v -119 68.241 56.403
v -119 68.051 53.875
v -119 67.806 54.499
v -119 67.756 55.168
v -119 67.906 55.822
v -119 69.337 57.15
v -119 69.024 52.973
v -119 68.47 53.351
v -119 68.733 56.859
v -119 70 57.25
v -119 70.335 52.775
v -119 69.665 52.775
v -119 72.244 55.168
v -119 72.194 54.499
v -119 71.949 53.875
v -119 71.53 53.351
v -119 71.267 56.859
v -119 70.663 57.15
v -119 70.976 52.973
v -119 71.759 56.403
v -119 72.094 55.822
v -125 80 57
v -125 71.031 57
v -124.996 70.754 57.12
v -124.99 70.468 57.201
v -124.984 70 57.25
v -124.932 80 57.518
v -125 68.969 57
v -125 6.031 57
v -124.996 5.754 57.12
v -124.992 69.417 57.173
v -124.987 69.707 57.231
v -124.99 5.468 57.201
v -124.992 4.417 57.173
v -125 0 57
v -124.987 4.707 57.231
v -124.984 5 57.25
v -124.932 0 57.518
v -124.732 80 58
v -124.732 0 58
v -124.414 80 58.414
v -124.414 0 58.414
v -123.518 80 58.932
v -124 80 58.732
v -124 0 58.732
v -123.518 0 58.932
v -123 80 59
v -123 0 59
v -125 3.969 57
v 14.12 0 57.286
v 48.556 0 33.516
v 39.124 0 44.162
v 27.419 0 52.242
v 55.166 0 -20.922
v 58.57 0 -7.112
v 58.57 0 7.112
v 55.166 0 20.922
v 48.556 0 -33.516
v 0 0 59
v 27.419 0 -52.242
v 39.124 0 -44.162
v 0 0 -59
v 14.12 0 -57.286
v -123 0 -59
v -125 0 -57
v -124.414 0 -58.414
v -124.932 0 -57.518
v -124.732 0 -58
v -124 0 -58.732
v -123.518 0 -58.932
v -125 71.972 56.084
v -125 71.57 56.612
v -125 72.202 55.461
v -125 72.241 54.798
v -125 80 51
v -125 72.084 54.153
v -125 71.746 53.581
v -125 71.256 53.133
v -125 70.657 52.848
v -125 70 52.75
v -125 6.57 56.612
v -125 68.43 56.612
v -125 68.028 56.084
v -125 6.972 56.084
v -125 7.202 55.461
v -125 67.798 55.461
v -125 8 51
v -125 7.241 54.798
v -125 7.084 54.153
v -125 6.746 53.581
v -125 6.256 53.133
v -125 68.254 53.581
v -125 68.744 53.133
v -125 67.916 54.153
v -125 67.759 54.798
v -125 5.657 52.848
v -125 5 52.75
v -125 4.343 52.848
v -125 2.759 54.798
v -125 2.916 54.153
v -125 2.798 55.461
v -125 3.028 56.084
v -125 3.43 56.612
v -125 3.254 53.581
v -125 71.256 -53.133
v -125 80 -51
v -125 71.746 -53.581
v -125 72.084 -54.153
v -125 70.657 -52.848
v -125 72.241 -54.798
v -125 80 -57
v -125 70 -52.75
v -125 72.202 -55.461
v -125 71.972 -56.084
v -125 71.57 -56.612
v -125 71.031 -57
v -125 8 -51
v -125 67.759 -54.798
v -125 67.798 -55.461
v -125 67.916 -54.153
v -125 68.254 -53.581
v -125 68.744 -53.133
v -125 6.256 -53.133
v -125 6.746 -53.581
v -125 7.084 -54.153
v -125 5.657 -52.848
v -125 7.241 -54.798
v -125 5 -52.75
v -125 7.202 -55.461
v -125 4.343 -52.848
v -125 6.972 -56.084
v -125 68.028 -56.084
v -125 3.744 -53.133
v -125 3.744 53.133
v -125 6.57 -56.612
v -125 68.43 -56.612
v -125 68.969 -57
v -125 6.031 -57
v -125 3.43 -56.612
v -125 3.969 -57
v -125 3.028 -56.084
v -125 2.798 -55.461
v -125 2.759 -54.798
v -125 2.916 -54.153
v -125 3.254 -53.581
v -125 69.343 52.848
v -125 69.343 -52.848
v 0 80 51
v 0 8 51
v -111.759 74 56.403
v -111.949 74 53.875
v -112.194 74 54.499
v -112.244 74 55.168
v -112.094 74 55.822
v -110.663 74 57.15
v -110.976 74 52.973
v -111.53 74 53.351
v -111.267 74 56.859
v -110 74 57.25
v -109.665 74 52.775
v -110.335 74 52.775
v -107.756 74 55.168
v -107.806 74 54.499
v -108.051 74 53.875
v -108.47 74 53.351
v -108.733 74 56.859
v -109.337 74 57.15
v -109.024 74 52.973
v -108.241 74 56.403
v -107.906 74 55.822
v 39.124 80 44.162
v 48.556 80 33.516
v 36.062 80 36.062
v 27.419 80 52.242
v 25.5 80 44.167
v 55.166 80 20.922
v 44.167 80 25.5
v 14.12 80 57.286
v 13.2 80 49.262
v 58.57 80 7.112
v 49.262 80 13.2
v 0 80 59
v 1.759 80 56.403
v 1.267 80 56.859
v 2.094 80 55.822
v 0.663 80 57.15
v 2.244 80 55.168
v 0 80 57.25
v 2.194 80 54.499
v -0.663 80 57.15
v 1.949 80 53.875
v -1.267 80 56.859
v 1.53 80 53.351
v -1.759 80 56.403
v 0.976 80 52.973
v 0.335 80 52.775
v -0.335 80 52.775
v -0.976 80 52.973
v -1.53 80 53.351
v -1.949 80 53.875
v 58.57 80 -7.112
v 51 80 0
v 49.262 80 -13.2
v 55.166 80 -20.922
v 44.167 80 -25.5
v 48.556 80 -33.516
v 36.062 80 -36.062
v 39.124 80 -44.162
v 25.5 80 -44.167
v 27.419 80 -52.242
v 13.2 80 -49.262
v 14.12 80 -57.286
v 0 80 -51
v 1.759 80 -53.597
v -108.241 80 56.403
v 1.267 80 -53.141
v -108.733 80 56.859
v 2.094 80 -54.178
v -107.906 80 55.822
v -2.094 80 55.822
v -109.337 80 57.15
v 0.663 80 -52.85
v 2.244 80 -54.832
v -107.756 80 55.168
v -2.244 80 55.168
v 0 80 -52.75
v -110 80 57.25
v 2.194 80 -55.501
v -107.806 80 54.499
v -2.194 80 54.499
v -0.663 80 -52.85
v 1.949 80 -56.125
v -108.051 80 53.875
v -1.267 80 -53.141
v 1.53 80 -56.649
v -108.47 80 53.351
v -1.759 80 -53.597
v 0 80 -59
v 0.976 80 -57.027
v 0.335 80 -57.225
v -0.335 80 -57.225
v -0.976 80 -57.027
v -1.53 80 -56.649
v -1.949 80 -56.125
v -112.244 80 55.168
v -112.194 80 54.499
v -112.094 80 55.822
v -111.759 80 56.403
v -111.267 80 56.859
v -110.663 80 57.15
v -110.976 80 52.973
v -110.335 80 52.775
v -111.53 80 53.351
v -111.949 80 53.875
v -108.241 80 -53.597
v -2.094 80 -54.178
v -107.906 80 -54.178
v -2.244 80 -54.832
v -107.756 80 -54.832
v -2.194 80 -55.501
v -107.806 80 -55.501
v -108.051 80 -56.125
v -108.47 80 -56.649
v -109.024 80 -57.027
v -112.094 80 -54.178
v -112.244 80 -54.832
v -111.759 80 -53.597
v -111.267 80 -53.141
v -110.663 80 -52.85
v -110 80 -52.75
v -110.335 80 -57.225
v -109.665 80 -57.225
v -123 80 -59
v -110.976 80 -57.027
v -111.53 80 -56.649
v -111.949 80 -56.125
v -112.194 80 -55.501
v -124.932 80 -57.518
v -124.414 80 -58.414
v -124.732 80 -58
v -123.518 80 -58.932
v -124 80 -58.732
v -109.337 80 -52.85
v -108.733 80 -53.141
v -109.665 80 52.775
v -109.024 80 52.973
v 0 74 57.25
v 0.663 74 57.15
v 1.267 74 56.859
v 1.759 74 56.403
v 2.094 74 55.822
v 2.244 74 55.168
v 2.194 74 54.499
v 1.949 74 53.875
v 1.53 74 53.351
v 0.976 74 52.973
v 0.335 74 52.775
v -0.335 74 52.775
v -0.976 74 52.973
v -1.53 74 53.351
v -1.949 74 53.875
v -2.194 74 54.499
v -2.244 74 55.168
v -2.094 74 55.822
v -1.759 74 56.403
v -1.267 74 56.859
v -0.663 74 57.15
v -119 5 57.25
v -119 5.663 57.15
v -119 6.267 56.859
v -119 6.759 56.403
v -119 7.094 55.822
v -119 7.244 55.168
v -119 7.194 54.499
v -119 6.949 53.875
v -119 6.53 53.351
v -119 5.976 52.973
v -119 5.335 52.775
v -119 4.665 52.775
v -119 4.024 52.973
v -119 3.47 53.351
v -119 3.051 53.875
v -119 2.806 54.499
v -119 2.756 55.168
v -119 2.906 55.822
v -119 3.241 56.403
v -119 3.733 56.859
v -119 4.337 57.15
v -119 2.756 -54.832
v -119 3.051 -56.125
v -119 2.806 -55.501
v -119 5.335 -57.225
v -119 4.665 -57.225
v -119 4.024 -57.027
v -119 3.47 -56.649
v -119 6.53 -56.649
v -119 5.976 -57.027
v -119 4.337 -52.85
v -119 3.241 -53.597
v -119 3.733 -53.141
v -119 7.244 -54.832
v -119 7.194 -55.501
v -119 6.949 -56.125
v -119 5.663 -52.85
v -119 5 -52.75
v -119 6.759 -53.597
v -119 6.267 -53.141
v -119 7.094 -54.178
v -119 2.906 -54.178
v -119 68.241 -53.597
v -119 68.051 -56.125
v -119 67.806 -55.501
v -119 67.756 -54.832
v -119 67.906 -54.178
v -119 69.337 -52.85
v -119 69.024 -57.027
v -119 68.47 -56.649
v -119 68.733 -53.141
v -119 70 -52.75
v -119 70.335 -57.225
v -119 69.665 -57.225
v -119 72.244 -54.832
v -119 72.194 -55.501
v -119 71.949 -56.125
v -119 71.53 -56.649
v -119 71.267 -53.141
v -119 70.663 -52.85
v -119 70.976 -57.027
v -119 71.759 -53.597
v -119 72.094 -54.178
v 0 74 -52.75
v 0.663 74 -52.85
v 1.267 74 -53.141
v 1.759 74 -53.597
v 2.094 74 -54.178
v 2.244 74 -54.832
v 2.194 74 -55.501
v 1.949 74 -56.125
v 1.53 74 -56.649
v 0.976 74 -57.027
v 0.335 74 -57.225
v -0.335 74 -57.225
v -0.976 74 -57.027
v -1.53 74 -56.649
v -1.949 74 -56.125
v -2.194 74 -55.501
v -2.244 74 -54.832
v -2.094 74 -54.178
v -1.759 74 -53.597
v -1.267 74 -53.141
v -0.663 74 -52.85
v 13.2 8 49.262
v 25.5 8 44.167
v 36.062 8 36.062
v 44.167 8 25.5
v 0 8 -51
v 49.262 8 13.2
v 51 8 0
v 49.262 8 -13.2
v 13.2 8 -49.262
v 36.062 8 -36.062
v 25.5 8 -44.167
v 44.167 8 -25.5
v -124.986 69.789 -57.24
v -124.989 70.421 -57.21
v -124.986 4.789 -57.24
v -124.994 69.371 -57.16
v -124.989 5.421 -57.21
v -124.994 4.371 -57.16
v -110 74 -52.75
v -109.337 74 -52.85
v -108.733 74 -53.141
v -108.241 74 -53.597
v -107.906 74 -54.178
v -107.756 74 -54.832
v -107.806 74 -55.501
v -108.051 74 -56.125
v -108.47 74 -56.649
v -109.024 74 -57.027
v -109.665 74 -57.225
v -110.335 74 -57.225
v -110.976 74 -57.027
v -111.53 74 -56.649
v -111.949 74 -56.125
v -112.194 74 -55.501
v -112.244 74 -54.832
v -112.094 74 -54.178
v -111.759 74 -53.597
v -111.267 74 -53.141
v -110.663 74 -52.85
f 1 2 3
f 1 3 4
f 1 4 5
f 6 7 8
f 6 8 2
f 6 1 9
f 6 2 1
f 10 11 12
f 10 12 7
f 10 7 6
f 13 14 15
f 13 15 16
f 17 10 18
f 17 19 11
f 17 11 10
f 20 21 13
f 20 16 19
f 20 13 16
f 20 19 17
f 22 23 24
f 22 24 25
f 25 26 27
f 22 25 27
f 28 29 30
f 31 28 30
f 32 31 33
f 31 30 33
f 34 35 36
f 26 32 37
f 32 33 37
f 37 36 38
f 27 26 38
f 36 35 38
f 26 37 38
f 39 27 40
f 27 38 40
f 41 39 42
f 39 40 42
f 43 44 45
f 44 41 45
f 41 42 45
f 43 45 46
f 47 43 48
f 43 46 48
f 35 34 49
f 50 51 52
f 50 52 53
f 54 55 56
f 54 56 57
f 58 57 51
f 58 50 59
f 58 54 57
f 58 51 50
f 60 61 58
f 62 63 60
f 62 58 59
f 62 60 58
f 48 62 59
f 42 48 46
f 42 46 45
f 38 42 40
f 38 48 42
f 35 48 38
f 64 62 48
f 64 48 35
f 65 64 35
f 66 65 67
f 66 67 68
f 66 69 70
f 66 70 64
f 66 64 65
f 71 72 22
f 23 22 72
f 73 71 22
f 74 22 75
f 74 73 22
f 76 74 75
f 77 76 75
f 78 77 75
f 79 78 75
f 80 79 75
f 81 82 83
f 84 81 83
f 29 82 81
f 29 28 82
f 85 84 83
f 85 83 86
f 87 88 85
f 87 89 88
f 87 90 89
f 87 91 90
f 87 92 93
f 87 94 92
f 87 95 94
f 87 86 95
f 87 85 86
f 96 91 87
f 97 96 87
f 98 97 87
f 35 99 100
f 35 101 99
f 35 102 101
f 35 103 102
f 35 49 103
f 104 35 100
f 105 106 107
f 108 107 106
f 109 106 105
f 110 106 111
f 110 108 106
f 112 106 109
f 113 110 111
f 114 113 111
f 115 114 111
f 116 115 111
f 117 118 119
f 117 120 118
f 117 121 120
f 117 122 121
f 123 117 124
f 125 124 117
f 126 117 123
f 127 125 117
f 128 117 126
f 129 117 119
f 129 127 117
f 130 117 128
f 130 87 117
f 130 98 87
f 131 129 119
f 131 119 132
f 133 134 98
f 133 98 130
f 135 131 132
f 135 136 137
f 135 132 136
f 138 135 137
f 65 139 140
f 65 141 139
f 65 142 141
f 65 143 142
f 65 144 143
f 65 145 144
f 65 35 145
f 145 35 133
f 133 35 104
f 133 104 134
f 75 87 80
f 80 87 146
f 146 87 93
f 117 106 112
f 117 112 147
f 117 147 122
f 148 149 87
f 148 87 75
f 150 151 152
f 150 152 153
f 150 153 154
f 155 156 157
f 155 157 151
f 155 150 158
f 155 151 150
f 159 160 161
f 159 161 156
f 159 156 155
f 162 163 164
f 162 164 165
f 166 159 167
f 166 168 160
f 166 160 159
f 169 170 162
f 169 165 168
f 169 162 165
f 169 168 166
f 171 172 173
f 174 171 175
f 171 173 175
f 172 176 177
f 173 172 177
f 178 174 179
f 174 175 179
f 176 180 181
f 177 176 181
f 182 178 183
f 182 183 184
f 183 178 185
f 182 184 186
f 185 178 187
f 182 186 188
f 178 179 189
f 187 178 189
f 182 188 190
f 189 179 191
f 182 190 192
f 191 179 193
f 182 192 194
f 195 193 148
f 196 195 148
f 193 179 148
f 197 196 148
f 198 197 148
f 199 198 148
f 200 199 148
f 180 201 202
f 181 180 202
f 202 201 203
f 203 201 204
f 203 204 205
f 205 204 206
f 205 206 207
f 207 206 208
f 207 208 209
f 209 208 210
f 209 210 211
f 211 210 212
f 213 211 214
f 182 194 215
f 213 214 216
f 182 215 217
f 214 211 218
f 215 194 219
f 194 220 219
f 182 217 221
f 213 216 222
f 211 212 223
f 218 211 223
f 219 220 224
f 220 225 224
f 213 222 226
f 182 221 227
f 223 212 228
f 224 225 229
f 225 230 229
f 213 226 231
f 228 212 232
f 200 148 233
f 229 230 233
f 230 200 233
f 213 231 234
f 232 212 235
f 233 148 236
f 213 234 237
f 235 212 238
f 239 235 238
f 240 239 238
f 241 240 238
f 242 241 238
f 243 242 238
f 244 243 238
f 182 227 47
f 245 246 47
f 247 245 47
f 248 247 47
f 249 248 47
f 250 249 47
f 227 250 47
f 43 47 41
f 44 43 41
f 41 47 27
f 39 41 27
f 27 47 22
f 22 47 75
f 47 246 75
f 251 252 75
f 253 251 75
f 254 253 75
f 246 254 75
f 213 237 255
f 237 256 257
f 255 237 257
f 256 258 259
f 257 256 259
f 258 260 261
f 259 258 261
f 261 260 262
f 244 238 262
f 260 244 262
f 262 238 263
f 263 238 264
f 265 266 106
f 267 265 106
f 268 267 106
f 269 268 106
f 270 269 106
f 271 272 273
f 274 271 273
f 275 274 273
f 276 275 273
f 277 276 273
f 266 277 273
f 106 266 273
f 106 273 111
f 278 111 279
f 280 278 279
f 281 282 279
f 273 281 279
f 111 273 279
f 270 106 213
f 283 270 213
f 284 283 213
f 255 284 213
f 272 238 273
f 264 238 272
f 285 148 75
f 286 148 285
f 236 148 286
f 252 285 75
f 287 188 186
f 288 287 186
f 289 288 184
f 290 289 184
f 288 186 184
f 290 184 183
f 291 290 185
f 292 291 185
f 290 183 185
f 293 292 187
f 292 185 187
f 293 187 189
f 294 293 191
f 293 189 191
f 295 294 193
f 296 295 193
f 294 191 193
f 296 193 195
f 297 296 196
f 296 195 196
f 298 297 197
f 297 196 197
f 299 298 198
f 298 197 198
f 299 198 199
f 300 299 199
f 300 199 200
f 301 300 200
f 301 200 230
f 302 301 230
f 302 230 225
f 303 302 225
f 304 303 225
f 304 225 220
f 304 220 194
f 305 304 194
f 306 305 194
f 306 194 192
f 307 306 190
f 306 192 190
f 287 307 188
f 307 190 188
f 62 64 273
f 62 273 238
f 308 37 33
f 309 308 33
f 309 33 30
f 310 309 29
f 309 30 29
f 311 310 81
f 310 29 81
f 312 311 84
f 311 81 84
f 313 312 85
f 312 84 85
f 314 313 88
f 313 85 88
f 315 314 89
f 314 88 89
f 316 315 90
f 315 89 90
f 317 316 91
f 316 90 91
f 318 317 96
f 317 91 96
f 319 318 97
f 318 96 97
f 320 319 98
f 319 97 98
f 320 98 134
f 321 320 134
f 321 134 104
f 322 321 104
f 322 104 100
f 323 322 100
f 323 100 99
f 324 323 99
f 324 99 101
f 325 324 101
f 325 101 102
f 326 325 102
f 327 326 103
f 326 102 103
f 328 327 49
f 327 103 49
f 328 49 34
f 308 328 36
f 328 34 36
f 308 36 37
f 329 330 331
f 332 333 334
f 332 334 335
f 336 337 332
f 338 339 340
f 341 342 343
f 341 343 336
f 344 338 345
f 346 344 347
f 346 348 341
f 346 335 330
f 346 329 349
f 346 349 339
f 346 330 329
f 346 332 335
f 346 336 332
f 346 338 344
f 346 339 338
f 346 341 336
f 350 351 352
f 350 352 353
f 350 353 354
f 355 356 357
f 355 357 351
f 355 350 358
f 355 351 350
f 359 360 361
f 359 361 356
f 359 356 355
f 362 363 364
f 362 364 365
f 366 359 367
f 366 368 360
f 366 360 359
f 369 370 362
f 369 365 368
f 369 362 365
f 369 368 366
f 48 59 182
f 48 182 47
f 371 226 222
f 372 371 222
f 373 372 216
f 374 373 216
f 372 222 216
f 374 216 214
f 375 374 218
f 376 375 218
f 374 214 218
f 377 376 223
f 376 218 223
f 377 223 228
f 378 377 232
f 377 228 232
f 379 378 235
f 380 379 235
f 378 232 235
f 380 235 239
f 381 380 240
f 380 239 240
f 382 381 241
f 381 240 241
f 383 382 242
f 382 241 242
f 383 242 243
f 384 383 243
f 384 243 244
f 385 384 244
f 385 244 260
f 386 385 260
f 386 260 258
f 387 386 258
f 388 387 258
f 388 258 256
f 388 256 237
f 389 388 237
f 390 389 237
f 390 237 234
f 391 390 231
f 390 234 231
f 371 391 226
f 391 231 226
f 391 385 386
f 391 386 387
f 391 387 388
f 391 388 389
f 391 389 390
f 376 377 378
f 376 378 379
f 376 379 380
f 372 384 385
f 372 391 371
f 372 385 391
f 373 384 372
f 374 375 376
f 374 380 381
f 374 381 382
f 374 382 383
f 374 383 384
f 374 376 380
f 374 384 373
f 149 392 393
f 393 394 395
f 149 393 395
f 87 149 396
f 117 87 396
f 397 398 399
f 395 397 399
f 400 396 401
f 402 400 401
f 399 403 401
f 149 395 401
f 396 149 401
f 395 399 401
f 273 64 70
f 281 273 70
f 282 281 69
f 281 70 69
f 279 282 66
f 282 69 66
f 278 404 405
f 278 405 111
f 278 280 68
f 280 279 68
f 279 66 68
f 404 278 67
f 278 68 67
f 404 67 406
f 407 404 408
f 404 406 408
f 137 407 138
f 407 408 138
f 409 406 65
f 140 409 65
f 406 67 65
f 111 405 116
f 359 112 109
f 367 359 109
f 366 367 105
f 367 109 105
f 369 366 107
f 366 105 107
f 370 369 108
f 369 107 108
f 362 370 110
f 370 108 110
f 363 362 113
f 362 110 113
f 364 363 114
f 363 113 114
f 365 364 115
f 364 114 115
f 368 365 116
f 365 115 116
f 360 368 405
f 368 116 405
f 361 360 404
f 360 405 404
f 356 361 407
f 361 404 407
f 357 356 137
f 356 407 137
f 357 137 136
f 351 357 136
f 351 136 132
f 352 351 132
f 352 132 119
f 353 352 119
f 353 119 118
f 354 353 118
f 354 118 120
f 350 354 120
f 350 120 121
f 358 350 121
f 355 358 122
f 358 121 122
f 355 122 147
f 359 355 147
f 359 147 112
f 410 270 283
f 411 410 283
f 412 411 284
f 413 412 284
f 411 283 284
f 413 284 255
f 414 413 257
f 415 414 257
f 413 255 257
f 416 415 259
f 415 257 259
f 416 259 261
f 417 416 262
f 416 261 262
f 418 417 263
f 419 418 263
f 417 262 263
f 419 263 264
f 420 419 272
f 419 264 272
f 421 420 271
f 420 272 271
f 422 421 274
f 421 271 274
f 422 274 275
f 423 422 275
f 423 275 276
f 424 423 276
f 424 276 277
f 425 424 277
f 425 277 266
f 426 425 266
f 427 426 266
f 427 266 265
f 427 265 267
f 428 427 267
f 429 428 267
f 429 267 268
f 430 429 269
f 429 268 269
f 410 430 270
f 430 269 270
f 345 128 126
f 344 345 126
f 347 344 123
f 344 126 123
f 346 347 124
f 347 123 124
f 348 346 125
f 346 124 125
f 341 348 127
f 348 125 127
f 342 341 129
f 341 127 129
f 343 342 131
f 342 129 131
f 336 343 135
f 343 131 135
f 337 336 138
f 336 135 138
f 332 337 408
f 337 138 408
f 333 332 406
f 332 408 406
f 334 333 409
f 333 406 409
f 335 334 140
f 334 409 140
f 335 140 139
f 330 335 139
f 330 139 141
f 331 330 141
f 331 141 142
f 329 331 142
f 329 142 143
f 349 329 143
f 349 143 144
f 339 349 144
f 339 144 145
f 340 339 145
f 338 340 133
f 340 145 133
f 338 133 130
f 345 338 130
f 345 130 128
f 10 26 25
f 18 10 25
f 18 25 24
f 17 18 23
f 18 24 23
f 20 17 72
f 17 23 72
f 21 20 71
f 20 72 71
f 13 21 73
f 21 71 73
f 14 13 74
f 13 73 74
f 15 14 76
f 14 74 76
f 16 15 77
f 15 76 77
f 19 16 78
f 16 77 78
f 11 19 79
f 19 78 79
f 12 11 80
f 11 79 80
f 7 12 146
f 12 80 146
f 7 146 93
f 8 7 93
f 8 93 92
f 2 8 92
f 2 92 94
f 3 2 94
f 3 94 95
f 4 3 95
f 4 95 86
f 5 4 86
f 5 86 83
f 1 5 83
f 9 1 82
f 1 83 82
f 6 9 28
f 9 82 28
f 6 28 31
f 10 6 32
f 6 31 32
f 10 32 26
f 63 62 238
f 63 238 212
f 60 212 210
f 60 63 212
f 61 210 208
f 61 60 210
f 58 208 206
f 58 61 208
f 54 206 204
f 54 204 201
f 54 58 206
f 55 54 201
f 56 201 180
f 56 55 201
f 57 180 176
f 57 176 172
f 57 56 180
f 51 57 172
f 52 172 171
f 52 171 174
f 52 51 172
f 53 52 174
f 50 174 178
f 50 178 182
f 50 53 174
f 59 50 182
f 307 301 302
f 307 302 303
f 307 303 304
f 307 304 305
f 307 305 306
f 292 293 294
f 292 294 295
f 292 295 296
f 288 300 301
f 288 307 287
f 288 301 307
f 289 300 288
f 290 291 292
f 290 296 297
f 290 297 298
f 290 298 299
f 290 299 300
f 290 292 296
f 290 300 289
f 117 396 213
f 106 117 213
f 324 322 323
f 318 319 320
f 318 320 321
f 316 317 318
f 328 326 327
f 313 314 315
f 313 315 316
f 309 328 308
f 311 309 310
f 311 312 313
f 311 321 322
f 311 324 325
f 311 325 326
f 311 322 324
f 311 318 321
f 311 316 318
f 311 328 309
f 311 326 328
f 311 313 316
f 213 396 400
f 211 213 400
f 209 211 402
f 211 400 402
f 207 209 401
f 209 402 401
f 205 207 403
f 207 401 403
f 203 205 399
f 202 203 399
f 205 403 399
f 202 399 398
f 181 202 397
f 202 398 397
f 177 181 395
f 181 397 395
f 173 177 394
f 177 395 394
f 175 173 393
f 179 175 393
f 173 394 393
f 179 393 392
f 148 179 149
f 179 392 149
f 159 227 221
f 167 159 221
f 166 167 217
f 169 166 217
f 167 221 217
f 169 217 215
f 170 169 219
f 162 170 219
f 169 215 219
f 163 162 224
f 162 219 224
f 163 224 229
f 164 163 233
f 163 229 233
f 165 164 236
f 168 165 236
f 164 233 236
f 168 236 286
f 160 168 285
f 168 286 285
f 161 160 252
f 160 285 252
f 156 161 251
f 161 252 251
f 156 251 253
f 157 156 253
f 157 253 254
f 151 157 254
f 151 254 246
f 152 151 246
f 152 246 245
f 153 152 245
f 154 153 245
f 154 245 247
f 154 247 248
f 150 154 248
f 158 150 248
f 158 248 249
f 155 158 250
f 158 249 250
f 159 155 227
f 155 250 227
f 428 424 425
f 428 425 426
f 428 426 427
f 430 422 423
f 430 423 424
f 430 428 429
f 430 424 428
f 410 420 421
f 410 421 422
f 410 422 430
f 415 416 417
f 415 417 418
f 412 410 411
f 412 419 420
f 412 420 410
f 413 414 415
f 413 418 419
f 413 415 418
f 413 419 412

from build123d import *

# Parameters (mm, degrees)
BOTTOMEXTRUDE_DEPTH = 80
SHELL1_T            = -8
SKETCH3_W           = 102
SKETCH3_H           = 72
CUT_EXTRUDE1_DEPTH  = 160.70597985
SKETCH4_R           = 2.25
CUT_EXTRUDE2_DEPTH  = 6
SKETCH5_R           = 2.25
CUT_EXTRUDE3_DEPTH  = 6
FILLET2_R           = 2
FILLET3_R           = 2


with BuildPart() as part:
    # Sketch2 → BottomExtrude (new body)
    with BuildSketch(Plane(origin=(0, 0, 0), x_dir=(1, 0, 0), z_dir=(0, 1, 0))):
        with BuildLine():
            Line((-125, 59), (0, 59))
            ThreePointArc((0, 59), (59, 0), (0, -59))
            Line((0, -59), (-125, -59))
            Line((-125, -59), (-125, 59))
        make_face()
    extrude(amount=BOTTOMEXTRUDE_DEPTH)

    # Shell1
    shell1_openings = [part.faces().sort_by_distance(p)[0] for p in [
        (-38.824706597, 80, 0),
    ]]
    offset(amount=SHELL1_T, openings=shell1_openings, kind=Kind.INTERSECTION)

    # Sketch3 → Cut-Extrude1 (cut, through all)
    with BuildSketch(Plane(origin=(0, 0, 0), x_dir=(0, 0, -1), z_dir=(1, 0, 0))):
        with Locations((0, 44)):
            Rectangle(SKETCH3_W, SKETCH3_H)
    extrude(amount=-CUT_EXTRUDE1_DEPTH, mode=Mode.SUBTRACT)

    # Sketch4 → Cut-Extrude2 (cut)
    with BuildSketch(Plane.ZY.offset(125)):
        with Locations((-55, 70)):
            Circle(SKETCH4_R)
        with Locations((55, 70)):
            Circle(SKETCH4_R)
        with Locations((55, 5)):
            Circle(SKETCH4_R)
        with Locations((-55, 5)):
            Circle(SKETCH4_R)
    extrude(amount=-CUT_EXTRUDE2_DEPTH, mode=Mode.SUBTRACT)

    # Sketch5 → Cut-Extrude3 (cut)
    with BuildSketch(Plane(origin=(0, 80, 0), x_dir=(1, 0, 0), z_dir=(0, 1, 0))):
        with Locations(Location((0, 55, 0), (0, 0, 270))):
            Circle(SKETCH5_R)
        with Locations(Location((-110, 55, 0), (0, 0, 270))):
            Circle(SKETCH5_R)
        with Locations(Location((-110, -55, 0), (0, 0, 270))):
            Circle(SKETCH5_R)
        with Locations(Location((0, -55, 0), (0, 0, 270))):
            Circle(SKETCH5_R)
    extrude(amount=-CUT_EXTRUDE3_DEPTH, mode=Mode.SUBTRACT)

    # Fillet2
    # the kernel refuses this fillet: 2 mm, written as the material it takes off along each edge
    with BuildSketch(Plane(origin=(-125, -5, -59), x_dir=(0, 0, 1), z_dir=(0, 1, 0))) as fillet2_piece_1:
        with BuildLine():
            CenterArc((FILLET2_R, FILLET2_R), FILLET2_R, 180, 90)
            Line((0, FILLET2_R), (0, 0))
            Line((0, 0), (FILLET2_R, 0))
        make_face()
    extrude(amount=90, mode=Mode.SUBTRACT)

    # Fillet3
    # the kernel refuses this fillet: 2 mm, written as the material it takes off along each edge
    with BuildSketch(Plane(origin=(-125, -5, 59), x_dir=(1, 0, 0), z_dir=(0, 1, 0))) as fillet3_piece_1:
        with BuildLine():
            CenterArc((FILLET3_R, FILLET3_R), FILLET3_R, 180, 90)
            Line((0, FILLET3_R), (0, 0))
            Line((0, 0), (FILLET3_R, 0))
        make_face()
    extrude(amount=90, mode=Mode.SUBTRACT)


solid = part.part
